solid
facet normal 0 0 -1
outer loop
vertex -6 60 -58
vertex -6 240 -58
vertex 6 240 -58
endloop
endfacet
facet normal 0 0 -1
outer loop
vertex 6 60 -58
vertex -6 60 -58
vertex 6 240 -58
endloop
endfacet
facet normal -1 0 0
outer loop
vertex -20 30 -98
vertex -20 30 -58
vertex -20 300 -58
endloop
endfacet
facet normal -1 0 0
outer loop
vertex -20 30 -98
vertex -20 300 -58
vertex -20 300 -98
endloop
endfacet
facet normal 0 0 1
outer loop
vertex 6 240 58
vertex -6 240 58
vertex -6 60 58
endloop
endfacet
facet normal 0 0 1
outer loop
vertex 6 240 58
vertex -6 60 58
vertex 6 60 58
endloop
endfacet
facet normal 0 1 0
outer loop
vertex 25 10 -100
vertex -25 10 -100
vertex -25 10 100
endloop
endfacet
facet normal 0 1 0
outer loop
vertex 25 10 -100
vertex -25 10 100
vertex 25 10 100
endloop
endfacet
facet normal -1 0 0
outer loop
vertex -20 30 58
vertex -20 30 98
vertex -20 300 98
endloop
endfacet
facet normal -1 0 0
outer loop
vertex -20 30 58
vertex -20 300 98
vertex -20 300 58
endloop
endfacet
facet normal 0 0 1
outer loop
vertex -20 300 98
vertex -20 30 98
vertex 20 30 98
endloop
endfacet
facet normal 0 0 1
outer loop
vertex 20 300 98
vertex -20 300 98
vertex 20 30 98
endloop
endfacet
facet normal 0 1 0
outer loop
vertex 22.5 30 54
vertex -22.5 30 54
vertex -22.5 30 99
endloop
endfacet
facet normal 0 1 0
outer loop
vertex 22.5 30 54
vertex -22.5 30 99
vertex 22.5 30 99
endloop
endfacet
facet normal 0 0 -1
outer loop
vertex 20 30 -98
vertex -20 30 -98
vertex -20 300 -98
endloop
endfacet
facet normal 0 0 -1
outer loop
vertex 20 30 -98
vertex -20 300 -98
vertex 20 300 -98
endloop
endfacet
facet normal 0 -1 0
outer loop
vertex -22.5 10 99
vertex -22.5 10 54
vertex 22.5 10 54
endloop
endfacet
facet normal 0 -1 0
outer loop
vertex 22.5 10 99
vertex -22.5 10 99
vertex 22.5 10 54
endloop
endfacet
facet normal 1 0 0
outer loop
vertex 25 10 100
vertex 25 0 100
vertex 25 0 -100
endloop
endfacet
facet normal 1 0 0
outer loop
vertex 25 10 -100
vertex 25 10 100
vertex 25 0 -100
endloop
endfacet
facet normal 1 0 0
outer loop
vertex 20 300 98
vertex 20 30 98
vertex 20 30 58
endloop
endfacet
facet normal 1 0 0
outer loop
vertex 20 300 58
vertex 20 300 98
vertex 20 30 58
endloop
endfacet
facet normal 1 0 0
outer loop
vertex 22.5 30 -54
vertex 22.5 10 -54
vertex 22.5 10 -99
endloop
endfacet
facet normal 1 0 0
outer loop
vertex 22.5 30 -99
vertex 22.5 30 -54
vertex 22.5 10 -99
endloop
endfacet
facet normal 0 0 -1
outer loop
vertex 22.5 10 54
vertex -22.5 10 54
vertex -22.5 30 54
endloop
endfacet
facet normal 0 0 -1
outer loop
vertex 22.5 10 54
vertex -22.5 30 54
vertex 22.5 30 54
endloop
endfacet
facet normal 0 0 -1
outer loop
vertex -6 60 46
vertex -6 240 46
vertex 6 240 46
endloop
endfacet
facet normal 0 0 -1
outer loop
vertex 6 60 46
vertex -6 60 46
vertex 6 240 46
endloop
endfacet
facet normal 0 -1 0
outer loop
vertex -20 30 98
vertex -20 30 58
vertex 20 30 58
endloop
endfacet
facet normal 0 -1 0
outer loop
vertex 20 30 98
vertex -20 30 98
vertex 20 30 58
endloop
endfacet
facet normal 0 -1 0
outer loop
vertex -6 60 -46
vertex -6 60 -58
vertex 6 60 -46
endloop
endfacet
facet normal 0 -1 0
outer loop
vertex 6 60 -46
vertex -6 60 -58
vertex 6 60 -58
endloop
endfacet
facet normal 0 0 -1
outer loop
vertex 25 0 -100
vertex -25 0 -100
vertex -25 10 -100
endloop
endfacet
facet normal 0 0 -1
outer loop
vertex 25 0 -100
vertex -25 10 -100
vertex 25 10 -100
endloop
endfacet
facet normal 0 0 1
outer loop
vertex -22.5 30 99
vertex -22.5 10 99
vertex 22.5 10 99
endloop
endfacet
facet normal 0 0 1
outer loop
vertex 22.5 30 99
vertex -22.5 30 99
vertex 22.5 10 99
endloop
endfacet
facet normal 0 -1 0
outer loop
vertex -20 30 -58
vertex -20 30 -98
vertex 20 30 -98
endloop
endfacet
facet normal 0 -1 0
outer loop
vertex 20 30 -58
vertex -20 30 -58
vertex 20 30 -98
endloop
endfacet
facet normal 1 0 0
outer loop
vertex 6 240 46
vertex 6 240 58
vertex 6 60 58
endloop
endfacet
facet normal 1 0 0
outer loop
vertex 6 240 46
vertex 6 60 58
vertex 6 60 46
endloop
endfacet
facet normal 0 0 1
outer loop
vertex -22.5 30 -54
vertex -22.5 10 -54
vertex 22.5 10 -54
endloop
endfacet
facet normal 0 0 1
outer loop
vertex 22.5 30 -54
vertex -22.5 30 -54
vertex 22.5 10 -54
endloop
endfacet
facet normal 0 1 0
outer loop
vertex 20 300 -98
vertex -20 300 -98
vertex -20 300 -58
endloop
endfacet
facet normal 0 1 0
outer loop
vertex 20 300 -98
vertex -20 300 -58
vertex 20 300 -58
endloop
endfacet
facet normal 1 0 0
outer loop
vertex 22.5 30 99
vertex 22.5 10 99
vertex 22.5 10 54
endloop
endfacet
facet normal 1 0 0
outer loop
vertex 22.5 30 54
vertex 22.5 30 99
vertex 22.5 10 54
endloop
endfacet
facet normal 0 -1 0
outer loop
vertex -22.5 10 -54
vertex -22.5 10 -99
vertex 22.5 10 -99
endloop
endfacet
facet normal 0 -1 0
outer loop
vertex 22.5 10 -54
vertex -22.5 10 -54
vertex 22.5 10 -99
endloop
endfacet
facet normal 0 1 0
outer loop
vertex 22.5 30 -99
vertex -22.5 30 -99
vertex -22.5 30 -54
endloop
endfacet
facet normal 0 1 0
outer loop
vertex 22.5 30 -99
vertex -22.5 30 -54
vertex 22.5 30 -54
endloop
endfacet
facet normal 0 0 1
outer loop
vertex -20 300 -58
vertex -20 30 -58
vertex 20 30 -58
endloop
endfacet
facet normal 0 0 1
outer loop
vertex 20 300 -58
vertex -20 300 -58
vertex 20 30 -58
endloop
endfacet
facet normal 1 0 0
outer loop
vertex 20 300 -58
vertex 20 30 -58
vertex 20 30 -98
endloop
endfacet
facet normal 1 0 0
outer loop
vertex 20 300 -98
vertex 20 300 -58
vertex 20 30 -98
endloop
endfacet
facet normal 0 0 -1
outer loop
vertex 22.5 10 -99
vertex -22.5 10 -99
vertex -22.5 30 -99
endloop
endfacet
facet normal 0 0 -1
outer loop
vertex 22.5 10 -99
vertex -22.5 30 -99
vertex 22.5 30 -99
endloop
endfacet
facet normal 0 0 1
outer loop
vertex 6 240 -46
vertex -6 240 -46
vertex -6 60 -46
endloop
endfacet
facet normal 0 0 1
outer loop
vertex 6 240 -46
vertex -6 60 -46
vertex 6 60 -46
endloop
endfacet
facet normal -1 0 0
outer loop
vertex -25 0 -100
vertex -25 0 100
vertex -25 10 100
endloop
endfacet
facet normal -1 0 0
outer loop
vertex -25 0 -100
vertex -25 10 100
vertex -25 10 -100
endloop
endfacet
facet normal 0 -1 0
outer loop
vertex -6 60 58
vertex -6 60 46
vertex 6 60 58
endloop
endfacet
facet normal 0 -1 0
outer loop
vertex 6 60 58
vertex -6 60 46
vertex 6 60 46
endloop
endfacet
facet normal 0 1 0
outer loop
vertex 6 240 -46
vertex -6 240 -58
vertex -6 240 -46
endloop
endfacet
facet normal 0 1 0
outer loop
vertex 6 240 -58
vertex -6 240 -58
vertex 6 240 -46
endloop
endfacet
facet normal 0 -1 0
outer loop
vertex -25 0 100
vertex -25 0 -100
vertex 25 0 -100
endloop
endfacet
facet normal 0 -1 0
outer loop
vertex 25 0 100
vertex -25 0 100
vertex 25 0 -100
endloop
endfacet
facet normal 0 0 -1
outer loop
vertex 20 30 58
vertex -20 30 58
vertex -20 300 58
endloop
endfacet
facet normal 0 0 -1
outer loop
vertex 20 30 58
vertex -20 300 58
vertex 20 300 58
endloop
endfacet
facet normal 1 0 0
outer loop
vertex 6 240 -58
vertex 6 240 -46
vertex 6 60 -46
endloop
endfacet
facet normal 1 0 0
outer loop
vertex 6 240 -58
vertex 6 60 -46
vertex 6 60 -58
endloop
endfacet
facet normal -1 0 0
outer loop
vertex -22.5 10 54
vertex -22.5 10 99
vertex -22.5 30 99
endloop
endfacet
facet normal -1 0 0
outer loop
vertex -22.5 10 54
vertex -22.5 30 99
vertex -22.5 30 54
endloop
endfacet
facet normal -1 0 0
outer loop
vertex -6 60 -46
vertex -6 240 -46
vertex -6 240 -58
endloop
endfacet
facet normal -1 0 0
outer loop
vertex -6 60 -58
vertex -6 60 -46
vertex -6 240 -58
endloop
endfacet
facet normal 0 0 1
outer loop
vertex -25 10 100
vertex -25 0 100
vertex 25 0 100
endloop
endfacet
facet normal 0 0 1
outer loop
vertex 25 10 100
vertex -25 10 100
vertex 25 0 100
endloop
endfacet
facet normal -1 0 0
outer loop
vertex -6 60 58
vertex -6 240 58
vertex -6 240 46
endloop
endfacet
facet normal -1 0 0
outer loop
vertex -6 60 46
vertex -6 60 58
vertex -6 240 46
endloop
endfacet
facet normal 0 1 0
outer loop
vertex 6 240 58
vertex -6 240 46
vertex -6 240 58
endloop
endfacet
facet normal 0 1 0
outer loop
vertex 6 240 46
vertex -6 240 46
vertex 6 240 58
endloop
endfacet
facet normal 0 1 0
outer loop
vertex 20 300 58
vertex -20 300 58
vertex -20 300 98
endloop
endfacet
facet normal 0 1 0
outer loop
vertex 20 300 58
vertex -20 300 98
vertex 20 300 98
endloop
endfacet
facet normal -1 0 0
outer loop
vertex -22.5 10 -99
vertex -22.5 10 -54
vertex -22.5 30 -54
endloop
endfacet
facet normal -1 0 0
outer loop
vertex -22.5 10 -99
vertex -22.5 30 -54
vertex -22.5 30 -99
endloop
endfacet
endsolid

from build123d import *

# Parameters (mm, degrees)
SKETCH1_W               = 50
SKETCH1_H               = 200
BOSS_EXTRUDE1_DEPTH     = 10
SKETCH2_W               = 45
SKETCH2_H               = 45
BOSS_EXTRUDE2_DEPTH     = 20
BOSS_EXTRUDE2_2_DEPTH   = 20
SKETCH3_W               = 40
SKETCH3_H               = 40
BOSS_EXTRUDE3_DEPTH     = 270
BOSS_EXTRUDE3_2_DEPTH   = 270
BOSS_EXTRUDE4_START     = -240
BOSS_EXTRUDE4_OUTLINE_W = 12
BOSS_EXTRUDE4_OUTLINE_H = 12
BOSS_EXTRUDE4_DEPTH     = 180


# Read off the part's stored shape, not the designer's step: Boss-Extrude4
with BuildPart() as part:
    # Sketch1 → Boss-Extrude1 (new body)
    with BuildSketch(Plane(origin=(0, 0, 0), x_dir=(1, 0, 0), z_dir=(0, 1, 0))):
        Rectangle(SKETCH1_W, SKETCH1_H)
    extrude(amount=BOSS_EXTRUDE1_DEPTH)


with BuildPart() as body_2:
    # Sketch2 → Boss-Extrude2 (new body)
    with BuildSketch(Plane(origin=(0, 10, 0), x_dir=(1, 0, 0), z_dir=(0, 1, 0))):
        with Locations((0, 76.5)):
            Rectangle(SKETCH2_W, SKETCH2_H)
    extrude(amount=BOSS_EXTRUDE2_DEPTH)


with BuildPart() as body_3:
    # Sketch2 → Boss-Extrude2 2 (new body)
    with BuildSketch(Plane(origin=(0, 10, 0), x_dir=(1, 0, 0), z_dir=(0, 1, 0))):
        with Locations((0, -76.5)):
            Rectangle(SKETCH2_W, SKETCH2_H)
    extrude(amount=BOSS_EXTRUDE2_2_DEPTH)


with BuildPart() as body_4:
    # Sketch3 → Boss-Extrude3 (new body)
    with BuildSketch(Plane(origin=(0, 30, 0), x_dir=(1, 0, 0), z_dir=(0, 1, 0))):
        with Locations((0, 78)):
            Rectangle(SKETCH3_W, SKETCH3_H)
    extrude(amount=BOSS_EXTRUDE3_DEPTH)


with BuildPart() as body_5:
    # Sketch3 → Boss-Extrude3 2 (new body)
    with BuildSketch(Plane(origin=(0, 30, 0), x_dir=(1, 0, 0), z_dir=(0, 1, 0))):
        with Locations((0, -78)):
            Rectangle(SKETCH3_W, SKETCH3_H)
    extrude(amount=BOSS_EXTRUDE3_2_DEPTH)


with BuildPart() as body_6:
    # Boss-Extrude4 outline → Boss-Extrude4 (new body)
    with BuildSketch(Plane(origin=(0, 300, 0), x_dir=(1, 0, 0), z_dir=(0, 1, 0)).offset(BOSS_EXTRUDE4_START)):
        with Locations((0, -52)):
            Rectangle(BOSS_EXTRUDE4_OUTLINE_W, BOSS_EXTRUDE4_OUTLINE_H)
        with Locations((0, 52)):
            Rectangle(BOSS_EXTRUDE4_OUTLINE_W, BOSS_EXTRUDE4_OUTLINE_H)
    extrude(amount=BOSS_EXTRUDE4_DEPTH)


solid = Compound([part.part, body_2.part, body_3.part, body_4.part, body_5.part, body_6.part])
